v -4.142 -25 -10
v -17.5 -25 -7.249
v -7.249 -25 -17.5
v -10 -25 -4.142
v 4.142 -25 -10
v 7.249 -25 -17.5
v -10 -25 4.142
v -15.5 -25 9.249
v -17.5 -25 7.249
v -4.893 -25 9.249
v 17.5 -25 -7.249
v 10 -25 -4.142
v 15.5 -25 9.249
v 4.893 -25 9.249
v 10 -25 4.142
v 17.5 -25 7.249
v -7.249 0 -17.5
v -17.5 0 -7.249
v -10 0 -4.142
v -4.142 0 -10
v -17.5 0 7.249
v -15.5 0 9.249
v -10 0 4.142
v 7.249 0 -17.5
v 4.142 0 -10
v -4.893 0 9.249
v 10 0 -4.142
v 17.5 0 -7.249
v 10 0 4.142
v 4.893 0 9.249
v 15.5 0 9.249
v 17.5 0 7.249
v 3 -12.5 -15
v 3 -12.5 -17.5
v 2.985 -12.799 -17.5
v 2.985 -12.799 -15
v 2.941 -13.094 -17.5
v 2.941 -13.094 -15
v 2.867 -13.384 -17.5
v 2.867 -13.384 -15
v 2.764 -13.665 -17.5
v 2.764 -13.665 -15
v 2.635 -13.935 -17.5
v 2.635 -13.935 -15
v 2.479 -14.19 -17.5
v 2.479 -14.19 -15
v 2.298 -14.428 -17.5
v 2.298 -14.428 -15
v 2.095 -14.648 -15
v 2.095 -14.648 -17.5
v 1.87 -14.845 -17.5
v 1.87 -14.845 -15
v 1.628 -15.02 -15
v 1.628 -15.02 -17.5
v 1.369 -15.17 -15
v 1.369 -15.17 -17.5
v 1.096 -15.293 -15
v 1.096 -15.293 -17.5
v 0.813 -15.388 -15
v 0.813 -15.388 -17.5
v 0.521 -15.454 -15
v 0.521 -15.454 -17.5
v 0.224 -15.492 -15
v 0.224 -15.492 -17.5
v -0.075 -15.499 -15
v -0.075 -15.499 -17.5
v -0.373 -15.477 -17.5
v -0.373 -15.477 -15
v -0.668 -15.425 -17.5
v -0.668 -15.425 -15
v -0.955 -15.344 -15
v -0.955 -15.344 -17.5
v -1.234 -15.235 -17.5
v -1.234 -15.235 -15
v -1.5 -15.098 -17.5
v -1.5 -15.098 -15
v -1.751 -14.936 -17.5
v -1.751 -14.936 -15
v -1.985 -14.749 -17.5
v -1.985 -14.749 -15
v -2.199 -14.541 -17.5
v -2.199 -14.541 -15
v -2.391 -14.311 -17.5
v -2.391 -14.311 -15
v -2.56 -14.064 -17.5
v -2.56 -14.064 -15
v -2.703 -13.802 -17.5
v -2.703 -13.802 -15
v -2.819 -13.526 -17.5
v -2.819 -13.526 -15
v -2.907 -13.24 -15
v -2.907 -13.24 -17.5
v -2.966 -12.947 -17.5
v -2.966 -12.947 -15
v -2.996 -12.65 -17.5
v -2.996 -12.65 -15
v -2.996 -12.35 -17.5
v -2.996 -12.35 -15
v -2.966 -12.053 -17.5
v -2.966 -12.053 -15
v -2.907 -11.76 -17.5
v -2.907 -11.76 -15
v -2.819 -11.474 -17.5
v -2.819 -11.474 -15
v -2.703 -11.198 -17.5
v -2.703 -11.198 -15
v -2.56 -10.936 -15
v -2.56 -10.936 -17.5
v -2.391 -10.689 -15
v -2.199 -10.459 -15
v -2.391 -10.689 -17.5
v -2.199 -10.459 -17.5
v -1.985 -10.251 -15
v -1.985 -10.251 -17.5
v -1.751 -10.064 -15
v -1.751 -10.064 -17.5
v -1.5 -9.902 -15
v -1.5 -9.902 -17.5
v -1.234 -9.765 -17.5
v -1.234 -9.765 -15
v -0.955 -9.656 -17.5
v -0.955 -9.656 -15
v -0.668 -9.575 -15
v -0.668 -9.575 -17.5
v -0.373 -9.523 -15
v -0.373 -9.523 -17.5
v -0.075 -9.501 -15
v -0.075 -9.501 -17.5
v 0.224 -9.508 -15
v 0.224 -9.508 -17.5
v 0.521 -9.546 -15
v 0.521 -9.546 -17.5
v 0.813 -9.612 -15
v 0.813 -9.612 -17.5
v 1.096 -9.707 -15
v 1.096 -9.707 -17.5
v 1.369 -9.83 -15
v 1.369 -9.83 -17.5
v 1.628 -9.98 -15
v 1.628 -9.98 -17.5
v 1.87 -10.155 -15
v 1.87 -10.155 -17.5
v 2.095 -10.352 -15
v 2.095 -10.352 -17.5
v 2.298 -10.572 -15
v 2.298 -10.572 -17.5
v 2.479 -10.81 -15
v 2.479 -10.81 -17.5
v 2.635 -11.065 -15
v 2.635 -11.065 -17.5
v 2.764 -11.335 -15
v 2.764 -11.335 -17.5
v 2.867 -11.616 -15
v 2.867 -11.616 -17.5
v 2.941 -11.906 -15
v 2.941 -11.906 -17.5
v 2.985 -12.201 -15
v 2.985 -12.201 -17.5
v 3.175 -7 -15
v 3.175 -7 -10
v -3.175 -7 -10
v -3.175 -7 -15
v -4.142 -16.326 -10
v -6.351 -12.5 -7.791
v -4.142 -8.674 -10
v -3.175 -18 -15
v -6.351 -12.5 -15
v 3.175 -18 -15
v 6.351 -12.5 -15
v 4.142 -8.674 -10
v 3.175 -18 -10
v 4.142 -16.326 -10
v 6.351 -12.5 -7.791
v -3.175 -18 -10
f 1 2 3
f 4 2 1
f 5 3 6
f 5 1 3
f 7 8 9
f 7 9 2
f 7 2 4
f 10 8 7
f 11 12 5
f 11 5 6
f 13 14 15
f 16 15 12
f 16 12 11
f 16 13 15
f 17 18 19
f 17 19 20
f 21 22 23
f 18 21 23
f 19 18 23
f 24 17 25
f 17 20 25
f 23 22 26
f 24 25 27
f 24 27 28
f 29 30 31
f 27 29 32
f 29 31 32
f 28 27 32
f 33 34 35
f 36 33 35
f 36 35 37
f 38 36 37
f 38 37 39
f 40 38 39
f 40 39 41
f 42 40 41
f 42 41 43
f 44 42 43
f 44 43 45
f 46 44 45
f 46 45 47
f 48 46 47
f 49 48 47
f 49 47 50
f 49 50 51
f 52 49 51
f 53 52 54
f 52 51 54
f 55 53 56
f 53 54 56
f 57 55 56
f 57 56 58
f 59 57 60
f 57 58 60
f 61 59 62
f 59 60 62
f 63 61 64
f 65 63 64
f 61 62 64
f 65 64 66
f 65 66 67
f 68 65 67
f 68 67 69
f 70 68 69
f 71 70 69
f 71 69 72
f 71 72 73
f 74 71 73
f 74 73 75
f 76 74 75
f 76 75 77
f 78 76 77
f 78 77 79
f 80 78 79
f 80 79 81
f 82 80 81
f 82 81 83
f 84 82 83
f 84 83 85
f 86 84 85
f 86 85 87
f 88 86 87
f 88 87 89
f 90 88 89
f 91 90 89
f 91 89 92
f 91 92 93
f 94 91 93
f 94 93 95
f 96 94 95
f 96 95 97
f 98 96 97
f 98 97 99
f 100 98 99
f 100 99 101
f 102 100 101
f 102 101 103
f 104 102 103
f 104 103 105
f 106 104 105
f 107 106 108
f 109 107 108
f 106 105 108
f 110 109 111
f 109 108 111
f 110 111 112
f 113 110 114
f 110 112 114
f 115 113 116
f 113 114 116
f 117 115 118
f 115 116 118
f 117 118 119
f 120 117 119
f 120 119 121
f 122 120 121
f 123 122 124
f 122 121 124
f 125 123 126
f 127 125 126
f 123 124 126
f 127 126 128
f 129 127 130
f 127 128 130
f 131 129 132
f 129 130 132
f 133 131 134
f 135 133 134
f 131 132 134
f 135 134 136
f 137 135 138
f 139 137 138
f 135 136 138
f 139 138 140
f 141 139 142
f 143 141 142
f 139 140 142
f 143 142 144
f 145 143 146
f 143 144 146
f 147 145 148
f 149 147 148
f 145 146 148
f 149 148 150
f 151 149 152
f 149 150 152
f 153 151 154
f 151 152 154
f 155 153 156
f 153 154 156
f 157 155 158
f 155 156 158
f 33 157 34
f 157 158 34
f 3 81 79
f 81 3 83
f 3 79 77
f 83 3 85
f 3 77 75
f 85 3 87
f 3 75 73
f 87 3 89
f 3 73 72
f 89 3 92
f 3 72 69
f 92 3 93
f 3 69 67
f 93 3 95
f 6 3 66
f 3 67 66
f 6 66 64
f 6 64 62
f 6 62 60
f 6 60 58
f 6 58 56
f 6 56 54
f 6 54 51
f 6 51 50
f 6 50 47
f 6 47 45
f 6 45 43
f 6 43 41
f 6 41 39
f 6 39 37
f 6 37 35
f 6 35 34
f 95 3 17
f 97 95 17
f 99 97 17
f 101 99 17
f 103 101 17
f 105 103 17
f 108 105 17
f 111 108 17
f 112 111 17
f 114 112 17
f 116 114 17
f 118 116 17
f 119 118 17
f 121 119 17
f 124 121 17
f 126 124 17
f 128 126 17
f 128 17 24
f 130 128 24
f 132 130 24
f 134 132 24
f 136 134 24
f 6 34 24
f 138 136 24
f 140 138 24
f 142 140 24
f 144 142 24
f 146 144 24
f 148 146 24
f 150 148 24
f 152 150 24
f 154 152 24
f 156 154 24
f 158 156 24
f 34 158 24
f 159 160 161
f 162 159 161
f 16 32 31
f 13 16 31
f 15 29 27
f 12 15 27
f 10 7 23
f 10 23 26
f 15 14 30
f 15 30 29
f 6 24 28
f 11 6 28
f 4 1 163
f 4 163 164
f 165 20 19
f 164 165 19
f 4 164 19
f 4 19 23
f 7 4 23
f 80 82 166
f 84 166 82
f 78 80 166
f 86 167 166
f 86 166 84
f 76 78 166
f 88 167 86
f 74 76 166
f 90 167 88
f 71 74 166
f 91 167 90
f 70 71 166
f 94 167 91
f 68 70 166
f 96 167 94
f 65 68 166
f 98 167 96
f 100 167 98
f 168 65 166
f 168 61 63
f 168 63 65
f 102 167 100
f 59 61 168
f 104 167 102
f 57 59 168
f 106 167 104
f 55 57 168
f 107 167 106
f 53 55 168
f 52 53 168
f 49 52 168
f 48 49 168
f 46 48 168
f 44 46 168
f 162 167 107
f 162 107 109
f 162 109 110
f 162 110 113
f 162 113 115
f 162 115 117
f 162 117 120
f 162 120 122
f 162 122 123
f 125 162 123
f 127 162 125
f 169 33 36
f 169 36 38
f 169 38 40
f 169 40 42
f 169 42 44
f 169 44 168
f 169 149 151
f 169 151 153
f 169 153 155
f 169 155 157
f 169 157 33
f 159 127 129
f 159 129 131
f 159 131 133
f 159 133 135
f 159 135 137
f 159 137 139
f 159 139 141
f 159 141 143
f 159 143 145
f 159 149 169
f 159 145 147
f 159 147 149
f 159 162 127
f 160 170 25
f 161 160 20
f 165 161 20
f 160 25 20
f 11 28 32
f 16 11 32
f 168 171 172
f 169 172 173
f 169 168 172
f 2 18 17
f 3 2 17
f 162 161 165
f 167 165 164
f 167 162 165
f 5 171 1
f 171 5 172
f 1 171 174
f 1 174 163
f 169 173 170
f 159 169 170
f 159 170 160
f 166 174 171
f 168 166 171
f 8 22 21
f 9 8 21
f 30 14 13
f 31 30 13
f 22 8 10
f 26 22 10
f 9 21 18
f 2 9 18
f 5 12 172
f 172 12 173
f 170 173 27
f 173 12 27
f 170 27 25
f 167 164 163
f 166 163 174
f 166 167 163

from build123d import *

# Parameters (mm, degrees)
F1_DEPTH      = 25
F2_W          = 35
F2_H          = 10
F3_DEPTH      = 40
F5_DEPTH      = 5
F5_DEPTH_BACK = 5
F6_R          = 3
F7_DEPTH      = 25


with BuildPart() as f1:
    # F0 (on Front) → F1 (new body)
    with BuildSketch(Plane.XZ):
        Polygon((17.5, -7.2487373415), (17.5, 7.2487373415), (7.2487373415, 17.5), (-7.2487373415, 17.5), (-17.5, 7.2487373415), (-17.5, -7.2487373415), (-7.2487373415, -17.5), (7.2487373415, -17.5), align=None)
        Polygon((4.1421356237, 10), (10, 4.1421356237), (10, -4.1421356237), (4.1421356237, -10), (-4.1421356237, -10), (-10, -4.1421356237), (-10, 4.1421356237), (-4.1421356237, 10), align=None, mode=Mode.SUBTRACT)
    extrude(amount=F1_DEPTH)

    # F2 (on face) → F3 (cut)
    with BuildSketch(Plane.XZ.offset(25)):
        with Locations((0, 14.2487373415)):
            Rectangle(F2_W, F2_H)
    extrude(amount=-F3_DEPTH, mode=Mode.SUBTRACT)

    # F4 (on face) → F5 (cut, two sides)
    with BuildSketch(Plane.XY.offset(-10)) as f5_sk:
        Polygon((3.1754264805, -7), (-3.1754264805, -7), (-6.3508529611, -12.5), (-3.1754264805, -18), (3.1754264805, -18), (6.3508529611, -12.5), align=None)
    extrude(amount=-F5_DEPTH, mode=Mode.SUBTRACT)
    extrude(f5_sk.sketch, amount=F5_DEPTH_BACK, mode=Mode.SUBTRACT)

    # F6 (on face) → F7 (cut)
    with BuildSketch(Plane(origin=(0, 0, -17.5), x_dir=(1, 0, 0), z_dir=(0, 0, -1))):
        with Locations((0, 12.5)):
            Circle(F6_R)
    extrude(amount=-F7_DEPTH, mode=Mode.SUBTRACT)


solid = f1.part
